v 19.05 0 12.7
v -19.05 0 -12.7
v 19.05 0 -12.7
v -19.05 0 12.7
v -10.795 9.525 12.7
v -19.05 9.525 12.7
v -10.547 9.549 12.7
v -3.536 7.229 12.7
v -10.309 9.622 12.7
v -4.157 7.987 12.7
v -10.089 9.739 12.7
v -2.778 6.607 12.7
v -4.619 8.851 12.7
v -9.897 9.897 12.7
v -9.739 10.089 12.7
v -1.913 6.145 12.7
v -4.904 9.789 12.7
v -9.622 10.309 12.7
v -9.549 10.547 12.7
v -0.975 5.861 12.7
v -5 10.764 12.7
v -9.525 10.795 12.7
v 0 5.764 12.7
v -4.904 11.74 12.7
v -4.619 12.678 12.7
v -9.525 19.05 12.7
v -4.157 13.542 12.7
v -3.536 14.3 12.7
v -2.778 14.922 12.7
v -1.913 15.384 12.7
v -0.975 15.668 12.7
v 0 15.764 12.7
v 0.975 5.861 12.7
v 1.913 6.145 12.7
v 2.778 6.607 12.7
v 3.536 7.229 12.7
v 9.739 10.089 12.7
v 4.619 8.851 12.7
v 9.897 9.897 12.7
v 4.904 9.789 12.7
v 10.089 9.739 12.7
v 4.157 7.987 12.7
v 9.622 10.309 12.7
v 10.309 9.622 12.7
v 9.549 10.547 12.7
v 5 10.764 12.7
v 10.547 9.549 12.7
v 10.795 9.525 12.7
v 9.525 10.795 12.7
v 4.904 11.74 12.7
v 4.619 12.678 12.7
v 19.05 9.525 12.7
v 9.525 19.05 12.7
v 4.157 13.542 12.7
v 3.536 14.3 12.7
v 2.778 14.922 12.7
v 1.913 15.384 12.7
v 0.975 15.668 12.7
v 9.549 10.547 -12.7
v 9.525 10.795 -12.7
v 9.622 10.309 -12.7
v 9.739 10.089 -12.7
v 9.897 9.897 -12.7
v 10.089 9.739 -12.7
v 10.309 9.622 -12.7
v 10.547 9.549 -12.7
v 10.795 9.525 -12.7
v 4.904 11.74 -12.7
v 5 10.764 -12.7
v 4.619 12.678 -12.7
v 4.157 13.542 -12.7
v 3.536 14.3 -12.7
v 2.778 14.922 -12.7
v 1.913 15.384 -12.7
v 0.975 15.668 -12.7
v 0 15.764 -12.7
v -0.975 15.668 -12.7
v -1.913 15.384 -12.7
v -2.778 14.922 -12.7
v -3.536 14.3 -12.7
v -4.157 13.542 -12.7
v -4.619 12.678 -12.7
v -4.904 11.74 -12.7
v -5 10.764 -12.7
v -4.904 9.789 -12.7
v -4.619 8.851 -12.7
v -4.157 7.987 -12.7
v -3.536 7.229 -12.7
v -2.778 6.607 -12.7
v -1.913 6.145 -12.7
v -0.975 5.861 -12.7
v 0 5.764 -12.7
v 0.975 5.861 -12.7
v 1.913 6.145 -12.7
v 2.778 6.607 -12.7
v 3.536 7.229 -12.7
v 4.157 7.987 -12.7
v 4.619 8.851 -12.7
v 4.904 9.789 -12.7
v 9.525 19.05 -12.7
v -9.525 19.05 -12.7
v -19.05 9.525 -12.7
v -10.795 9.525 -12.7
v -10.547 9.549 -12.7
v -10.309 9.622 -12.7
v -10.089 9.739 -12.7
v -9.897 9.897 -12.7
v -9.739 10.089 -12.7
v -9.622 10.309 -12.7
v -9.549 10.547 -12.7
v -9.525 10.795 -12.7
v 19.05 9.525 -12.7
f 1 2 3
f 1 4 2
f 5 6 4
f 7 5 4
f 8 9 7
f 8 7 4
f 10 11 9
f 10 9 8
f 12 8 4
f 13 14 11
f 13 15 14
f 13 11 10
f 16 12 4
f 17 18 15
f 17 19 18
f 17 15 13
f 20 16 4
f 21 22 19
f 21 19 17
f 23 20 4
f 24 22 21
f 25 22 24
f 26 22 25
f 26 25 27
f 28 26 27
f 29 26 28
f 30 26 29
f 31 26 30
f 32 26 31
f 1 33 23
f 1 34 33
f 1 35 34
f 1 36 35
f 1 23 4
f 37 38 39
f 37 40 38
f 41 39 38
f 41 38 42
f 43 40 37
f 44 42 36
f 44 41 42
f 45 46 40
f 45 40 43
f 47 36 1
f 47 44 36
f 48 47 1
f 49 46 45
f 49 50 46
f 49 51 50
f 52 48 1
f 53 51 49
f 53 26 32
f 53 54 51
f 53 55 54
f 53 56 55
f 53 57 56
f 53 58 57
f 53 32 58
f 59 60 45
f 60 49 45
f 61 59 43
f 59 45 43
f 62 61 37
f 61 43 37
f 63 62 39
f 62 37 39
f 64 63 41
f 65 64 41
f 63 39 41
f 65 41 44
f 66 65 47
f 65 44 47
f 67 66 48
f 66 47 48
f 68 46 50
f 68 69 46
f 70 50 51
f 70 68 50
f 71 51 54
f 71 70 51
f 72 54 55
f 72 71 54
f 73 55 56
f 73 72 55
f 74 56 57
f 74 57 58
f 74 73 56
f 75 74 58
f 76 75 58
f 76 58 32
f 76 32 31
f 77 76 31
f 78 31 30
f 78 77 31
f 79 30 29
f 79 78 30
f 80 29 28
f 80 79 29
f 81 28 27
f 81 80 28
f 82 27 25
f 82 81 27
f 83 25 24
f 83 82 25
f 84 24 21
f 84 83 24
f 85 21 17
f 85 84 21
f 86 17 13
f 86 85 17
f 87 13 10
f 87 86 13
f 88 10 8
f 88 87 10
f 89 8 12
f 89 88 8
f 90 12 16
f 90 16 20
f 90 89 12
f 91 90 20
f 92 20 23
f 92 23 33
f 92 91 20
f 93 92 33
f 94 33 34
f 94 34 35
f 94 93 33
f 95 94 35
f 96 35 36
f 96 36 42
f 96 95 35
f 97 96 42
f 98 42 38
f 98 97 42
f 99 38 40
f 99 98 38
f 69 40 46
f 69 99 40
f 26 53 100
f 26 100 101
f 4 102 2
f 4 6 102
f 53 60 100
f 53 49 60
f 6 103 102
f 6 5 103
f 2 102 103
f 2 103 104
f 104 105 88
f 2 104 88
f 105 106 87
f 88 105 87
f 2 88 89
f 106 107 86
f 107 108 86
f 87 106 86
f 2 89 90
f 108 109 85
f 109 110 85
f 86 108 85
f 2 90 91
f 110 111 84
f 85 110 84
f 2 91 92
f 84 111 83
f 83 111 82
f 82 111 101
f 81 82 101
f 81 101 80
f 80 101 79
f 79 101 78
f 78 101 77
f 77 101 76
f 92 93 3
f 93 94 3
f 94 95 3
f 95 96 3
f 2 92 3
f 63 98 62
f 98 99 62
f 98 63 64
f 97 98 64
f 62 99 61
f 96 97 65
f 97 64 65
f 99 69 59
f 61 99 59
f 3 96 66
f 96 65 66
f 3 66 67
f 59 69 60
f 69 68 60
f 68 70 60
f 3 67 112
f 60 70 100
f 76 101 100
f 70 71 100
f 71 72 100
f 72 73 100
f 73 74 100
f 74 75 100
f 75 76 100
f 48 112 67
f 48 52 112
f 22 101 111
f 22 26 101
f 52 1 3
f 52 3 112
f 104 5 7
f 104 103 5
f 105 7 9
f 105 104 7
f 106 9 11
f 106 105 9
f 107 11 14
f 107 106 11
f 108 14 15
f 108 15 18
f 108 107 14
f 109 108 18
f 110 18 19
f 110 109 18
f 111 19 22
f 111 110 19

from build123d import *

# Parameters (mm, degrees)
SKETCH1_R           = 5
BOSS_EXTRUDE1_DEPTH = 12.7
FILLET1_R           = 1.27


with BuildPart() as part:
    # Sketch1 → Boss-Extrude1 (new body, symmetric)
    with BuildSketch(Plane.XY):
        Polygon((-19.05, 0), (19.05, 0), (19.05, 9.525), (9.525, 9.525), (9.525, 19.05), (-9.525, 19.05), (-9.525, 9.525), (-19.05, 9.525), align=None)
        with Locations((0, 10.764499551)):
            Circle(SKETCH1_R, mode=Mode.SUBTRACT)
    extrude(amount=BOSS_EXTRUDE1_DEPTH, both=True)

    # Fillet1
    fillet1_edges = [part.edges().sort_by_distance(p)[0] for p in [
        (-9.525, 9.525, 0),
        (9.525, 9.525, 0),
    ]]
    fillet(fillet1_edges, radius=FILLET1_R)


solid = part.part
